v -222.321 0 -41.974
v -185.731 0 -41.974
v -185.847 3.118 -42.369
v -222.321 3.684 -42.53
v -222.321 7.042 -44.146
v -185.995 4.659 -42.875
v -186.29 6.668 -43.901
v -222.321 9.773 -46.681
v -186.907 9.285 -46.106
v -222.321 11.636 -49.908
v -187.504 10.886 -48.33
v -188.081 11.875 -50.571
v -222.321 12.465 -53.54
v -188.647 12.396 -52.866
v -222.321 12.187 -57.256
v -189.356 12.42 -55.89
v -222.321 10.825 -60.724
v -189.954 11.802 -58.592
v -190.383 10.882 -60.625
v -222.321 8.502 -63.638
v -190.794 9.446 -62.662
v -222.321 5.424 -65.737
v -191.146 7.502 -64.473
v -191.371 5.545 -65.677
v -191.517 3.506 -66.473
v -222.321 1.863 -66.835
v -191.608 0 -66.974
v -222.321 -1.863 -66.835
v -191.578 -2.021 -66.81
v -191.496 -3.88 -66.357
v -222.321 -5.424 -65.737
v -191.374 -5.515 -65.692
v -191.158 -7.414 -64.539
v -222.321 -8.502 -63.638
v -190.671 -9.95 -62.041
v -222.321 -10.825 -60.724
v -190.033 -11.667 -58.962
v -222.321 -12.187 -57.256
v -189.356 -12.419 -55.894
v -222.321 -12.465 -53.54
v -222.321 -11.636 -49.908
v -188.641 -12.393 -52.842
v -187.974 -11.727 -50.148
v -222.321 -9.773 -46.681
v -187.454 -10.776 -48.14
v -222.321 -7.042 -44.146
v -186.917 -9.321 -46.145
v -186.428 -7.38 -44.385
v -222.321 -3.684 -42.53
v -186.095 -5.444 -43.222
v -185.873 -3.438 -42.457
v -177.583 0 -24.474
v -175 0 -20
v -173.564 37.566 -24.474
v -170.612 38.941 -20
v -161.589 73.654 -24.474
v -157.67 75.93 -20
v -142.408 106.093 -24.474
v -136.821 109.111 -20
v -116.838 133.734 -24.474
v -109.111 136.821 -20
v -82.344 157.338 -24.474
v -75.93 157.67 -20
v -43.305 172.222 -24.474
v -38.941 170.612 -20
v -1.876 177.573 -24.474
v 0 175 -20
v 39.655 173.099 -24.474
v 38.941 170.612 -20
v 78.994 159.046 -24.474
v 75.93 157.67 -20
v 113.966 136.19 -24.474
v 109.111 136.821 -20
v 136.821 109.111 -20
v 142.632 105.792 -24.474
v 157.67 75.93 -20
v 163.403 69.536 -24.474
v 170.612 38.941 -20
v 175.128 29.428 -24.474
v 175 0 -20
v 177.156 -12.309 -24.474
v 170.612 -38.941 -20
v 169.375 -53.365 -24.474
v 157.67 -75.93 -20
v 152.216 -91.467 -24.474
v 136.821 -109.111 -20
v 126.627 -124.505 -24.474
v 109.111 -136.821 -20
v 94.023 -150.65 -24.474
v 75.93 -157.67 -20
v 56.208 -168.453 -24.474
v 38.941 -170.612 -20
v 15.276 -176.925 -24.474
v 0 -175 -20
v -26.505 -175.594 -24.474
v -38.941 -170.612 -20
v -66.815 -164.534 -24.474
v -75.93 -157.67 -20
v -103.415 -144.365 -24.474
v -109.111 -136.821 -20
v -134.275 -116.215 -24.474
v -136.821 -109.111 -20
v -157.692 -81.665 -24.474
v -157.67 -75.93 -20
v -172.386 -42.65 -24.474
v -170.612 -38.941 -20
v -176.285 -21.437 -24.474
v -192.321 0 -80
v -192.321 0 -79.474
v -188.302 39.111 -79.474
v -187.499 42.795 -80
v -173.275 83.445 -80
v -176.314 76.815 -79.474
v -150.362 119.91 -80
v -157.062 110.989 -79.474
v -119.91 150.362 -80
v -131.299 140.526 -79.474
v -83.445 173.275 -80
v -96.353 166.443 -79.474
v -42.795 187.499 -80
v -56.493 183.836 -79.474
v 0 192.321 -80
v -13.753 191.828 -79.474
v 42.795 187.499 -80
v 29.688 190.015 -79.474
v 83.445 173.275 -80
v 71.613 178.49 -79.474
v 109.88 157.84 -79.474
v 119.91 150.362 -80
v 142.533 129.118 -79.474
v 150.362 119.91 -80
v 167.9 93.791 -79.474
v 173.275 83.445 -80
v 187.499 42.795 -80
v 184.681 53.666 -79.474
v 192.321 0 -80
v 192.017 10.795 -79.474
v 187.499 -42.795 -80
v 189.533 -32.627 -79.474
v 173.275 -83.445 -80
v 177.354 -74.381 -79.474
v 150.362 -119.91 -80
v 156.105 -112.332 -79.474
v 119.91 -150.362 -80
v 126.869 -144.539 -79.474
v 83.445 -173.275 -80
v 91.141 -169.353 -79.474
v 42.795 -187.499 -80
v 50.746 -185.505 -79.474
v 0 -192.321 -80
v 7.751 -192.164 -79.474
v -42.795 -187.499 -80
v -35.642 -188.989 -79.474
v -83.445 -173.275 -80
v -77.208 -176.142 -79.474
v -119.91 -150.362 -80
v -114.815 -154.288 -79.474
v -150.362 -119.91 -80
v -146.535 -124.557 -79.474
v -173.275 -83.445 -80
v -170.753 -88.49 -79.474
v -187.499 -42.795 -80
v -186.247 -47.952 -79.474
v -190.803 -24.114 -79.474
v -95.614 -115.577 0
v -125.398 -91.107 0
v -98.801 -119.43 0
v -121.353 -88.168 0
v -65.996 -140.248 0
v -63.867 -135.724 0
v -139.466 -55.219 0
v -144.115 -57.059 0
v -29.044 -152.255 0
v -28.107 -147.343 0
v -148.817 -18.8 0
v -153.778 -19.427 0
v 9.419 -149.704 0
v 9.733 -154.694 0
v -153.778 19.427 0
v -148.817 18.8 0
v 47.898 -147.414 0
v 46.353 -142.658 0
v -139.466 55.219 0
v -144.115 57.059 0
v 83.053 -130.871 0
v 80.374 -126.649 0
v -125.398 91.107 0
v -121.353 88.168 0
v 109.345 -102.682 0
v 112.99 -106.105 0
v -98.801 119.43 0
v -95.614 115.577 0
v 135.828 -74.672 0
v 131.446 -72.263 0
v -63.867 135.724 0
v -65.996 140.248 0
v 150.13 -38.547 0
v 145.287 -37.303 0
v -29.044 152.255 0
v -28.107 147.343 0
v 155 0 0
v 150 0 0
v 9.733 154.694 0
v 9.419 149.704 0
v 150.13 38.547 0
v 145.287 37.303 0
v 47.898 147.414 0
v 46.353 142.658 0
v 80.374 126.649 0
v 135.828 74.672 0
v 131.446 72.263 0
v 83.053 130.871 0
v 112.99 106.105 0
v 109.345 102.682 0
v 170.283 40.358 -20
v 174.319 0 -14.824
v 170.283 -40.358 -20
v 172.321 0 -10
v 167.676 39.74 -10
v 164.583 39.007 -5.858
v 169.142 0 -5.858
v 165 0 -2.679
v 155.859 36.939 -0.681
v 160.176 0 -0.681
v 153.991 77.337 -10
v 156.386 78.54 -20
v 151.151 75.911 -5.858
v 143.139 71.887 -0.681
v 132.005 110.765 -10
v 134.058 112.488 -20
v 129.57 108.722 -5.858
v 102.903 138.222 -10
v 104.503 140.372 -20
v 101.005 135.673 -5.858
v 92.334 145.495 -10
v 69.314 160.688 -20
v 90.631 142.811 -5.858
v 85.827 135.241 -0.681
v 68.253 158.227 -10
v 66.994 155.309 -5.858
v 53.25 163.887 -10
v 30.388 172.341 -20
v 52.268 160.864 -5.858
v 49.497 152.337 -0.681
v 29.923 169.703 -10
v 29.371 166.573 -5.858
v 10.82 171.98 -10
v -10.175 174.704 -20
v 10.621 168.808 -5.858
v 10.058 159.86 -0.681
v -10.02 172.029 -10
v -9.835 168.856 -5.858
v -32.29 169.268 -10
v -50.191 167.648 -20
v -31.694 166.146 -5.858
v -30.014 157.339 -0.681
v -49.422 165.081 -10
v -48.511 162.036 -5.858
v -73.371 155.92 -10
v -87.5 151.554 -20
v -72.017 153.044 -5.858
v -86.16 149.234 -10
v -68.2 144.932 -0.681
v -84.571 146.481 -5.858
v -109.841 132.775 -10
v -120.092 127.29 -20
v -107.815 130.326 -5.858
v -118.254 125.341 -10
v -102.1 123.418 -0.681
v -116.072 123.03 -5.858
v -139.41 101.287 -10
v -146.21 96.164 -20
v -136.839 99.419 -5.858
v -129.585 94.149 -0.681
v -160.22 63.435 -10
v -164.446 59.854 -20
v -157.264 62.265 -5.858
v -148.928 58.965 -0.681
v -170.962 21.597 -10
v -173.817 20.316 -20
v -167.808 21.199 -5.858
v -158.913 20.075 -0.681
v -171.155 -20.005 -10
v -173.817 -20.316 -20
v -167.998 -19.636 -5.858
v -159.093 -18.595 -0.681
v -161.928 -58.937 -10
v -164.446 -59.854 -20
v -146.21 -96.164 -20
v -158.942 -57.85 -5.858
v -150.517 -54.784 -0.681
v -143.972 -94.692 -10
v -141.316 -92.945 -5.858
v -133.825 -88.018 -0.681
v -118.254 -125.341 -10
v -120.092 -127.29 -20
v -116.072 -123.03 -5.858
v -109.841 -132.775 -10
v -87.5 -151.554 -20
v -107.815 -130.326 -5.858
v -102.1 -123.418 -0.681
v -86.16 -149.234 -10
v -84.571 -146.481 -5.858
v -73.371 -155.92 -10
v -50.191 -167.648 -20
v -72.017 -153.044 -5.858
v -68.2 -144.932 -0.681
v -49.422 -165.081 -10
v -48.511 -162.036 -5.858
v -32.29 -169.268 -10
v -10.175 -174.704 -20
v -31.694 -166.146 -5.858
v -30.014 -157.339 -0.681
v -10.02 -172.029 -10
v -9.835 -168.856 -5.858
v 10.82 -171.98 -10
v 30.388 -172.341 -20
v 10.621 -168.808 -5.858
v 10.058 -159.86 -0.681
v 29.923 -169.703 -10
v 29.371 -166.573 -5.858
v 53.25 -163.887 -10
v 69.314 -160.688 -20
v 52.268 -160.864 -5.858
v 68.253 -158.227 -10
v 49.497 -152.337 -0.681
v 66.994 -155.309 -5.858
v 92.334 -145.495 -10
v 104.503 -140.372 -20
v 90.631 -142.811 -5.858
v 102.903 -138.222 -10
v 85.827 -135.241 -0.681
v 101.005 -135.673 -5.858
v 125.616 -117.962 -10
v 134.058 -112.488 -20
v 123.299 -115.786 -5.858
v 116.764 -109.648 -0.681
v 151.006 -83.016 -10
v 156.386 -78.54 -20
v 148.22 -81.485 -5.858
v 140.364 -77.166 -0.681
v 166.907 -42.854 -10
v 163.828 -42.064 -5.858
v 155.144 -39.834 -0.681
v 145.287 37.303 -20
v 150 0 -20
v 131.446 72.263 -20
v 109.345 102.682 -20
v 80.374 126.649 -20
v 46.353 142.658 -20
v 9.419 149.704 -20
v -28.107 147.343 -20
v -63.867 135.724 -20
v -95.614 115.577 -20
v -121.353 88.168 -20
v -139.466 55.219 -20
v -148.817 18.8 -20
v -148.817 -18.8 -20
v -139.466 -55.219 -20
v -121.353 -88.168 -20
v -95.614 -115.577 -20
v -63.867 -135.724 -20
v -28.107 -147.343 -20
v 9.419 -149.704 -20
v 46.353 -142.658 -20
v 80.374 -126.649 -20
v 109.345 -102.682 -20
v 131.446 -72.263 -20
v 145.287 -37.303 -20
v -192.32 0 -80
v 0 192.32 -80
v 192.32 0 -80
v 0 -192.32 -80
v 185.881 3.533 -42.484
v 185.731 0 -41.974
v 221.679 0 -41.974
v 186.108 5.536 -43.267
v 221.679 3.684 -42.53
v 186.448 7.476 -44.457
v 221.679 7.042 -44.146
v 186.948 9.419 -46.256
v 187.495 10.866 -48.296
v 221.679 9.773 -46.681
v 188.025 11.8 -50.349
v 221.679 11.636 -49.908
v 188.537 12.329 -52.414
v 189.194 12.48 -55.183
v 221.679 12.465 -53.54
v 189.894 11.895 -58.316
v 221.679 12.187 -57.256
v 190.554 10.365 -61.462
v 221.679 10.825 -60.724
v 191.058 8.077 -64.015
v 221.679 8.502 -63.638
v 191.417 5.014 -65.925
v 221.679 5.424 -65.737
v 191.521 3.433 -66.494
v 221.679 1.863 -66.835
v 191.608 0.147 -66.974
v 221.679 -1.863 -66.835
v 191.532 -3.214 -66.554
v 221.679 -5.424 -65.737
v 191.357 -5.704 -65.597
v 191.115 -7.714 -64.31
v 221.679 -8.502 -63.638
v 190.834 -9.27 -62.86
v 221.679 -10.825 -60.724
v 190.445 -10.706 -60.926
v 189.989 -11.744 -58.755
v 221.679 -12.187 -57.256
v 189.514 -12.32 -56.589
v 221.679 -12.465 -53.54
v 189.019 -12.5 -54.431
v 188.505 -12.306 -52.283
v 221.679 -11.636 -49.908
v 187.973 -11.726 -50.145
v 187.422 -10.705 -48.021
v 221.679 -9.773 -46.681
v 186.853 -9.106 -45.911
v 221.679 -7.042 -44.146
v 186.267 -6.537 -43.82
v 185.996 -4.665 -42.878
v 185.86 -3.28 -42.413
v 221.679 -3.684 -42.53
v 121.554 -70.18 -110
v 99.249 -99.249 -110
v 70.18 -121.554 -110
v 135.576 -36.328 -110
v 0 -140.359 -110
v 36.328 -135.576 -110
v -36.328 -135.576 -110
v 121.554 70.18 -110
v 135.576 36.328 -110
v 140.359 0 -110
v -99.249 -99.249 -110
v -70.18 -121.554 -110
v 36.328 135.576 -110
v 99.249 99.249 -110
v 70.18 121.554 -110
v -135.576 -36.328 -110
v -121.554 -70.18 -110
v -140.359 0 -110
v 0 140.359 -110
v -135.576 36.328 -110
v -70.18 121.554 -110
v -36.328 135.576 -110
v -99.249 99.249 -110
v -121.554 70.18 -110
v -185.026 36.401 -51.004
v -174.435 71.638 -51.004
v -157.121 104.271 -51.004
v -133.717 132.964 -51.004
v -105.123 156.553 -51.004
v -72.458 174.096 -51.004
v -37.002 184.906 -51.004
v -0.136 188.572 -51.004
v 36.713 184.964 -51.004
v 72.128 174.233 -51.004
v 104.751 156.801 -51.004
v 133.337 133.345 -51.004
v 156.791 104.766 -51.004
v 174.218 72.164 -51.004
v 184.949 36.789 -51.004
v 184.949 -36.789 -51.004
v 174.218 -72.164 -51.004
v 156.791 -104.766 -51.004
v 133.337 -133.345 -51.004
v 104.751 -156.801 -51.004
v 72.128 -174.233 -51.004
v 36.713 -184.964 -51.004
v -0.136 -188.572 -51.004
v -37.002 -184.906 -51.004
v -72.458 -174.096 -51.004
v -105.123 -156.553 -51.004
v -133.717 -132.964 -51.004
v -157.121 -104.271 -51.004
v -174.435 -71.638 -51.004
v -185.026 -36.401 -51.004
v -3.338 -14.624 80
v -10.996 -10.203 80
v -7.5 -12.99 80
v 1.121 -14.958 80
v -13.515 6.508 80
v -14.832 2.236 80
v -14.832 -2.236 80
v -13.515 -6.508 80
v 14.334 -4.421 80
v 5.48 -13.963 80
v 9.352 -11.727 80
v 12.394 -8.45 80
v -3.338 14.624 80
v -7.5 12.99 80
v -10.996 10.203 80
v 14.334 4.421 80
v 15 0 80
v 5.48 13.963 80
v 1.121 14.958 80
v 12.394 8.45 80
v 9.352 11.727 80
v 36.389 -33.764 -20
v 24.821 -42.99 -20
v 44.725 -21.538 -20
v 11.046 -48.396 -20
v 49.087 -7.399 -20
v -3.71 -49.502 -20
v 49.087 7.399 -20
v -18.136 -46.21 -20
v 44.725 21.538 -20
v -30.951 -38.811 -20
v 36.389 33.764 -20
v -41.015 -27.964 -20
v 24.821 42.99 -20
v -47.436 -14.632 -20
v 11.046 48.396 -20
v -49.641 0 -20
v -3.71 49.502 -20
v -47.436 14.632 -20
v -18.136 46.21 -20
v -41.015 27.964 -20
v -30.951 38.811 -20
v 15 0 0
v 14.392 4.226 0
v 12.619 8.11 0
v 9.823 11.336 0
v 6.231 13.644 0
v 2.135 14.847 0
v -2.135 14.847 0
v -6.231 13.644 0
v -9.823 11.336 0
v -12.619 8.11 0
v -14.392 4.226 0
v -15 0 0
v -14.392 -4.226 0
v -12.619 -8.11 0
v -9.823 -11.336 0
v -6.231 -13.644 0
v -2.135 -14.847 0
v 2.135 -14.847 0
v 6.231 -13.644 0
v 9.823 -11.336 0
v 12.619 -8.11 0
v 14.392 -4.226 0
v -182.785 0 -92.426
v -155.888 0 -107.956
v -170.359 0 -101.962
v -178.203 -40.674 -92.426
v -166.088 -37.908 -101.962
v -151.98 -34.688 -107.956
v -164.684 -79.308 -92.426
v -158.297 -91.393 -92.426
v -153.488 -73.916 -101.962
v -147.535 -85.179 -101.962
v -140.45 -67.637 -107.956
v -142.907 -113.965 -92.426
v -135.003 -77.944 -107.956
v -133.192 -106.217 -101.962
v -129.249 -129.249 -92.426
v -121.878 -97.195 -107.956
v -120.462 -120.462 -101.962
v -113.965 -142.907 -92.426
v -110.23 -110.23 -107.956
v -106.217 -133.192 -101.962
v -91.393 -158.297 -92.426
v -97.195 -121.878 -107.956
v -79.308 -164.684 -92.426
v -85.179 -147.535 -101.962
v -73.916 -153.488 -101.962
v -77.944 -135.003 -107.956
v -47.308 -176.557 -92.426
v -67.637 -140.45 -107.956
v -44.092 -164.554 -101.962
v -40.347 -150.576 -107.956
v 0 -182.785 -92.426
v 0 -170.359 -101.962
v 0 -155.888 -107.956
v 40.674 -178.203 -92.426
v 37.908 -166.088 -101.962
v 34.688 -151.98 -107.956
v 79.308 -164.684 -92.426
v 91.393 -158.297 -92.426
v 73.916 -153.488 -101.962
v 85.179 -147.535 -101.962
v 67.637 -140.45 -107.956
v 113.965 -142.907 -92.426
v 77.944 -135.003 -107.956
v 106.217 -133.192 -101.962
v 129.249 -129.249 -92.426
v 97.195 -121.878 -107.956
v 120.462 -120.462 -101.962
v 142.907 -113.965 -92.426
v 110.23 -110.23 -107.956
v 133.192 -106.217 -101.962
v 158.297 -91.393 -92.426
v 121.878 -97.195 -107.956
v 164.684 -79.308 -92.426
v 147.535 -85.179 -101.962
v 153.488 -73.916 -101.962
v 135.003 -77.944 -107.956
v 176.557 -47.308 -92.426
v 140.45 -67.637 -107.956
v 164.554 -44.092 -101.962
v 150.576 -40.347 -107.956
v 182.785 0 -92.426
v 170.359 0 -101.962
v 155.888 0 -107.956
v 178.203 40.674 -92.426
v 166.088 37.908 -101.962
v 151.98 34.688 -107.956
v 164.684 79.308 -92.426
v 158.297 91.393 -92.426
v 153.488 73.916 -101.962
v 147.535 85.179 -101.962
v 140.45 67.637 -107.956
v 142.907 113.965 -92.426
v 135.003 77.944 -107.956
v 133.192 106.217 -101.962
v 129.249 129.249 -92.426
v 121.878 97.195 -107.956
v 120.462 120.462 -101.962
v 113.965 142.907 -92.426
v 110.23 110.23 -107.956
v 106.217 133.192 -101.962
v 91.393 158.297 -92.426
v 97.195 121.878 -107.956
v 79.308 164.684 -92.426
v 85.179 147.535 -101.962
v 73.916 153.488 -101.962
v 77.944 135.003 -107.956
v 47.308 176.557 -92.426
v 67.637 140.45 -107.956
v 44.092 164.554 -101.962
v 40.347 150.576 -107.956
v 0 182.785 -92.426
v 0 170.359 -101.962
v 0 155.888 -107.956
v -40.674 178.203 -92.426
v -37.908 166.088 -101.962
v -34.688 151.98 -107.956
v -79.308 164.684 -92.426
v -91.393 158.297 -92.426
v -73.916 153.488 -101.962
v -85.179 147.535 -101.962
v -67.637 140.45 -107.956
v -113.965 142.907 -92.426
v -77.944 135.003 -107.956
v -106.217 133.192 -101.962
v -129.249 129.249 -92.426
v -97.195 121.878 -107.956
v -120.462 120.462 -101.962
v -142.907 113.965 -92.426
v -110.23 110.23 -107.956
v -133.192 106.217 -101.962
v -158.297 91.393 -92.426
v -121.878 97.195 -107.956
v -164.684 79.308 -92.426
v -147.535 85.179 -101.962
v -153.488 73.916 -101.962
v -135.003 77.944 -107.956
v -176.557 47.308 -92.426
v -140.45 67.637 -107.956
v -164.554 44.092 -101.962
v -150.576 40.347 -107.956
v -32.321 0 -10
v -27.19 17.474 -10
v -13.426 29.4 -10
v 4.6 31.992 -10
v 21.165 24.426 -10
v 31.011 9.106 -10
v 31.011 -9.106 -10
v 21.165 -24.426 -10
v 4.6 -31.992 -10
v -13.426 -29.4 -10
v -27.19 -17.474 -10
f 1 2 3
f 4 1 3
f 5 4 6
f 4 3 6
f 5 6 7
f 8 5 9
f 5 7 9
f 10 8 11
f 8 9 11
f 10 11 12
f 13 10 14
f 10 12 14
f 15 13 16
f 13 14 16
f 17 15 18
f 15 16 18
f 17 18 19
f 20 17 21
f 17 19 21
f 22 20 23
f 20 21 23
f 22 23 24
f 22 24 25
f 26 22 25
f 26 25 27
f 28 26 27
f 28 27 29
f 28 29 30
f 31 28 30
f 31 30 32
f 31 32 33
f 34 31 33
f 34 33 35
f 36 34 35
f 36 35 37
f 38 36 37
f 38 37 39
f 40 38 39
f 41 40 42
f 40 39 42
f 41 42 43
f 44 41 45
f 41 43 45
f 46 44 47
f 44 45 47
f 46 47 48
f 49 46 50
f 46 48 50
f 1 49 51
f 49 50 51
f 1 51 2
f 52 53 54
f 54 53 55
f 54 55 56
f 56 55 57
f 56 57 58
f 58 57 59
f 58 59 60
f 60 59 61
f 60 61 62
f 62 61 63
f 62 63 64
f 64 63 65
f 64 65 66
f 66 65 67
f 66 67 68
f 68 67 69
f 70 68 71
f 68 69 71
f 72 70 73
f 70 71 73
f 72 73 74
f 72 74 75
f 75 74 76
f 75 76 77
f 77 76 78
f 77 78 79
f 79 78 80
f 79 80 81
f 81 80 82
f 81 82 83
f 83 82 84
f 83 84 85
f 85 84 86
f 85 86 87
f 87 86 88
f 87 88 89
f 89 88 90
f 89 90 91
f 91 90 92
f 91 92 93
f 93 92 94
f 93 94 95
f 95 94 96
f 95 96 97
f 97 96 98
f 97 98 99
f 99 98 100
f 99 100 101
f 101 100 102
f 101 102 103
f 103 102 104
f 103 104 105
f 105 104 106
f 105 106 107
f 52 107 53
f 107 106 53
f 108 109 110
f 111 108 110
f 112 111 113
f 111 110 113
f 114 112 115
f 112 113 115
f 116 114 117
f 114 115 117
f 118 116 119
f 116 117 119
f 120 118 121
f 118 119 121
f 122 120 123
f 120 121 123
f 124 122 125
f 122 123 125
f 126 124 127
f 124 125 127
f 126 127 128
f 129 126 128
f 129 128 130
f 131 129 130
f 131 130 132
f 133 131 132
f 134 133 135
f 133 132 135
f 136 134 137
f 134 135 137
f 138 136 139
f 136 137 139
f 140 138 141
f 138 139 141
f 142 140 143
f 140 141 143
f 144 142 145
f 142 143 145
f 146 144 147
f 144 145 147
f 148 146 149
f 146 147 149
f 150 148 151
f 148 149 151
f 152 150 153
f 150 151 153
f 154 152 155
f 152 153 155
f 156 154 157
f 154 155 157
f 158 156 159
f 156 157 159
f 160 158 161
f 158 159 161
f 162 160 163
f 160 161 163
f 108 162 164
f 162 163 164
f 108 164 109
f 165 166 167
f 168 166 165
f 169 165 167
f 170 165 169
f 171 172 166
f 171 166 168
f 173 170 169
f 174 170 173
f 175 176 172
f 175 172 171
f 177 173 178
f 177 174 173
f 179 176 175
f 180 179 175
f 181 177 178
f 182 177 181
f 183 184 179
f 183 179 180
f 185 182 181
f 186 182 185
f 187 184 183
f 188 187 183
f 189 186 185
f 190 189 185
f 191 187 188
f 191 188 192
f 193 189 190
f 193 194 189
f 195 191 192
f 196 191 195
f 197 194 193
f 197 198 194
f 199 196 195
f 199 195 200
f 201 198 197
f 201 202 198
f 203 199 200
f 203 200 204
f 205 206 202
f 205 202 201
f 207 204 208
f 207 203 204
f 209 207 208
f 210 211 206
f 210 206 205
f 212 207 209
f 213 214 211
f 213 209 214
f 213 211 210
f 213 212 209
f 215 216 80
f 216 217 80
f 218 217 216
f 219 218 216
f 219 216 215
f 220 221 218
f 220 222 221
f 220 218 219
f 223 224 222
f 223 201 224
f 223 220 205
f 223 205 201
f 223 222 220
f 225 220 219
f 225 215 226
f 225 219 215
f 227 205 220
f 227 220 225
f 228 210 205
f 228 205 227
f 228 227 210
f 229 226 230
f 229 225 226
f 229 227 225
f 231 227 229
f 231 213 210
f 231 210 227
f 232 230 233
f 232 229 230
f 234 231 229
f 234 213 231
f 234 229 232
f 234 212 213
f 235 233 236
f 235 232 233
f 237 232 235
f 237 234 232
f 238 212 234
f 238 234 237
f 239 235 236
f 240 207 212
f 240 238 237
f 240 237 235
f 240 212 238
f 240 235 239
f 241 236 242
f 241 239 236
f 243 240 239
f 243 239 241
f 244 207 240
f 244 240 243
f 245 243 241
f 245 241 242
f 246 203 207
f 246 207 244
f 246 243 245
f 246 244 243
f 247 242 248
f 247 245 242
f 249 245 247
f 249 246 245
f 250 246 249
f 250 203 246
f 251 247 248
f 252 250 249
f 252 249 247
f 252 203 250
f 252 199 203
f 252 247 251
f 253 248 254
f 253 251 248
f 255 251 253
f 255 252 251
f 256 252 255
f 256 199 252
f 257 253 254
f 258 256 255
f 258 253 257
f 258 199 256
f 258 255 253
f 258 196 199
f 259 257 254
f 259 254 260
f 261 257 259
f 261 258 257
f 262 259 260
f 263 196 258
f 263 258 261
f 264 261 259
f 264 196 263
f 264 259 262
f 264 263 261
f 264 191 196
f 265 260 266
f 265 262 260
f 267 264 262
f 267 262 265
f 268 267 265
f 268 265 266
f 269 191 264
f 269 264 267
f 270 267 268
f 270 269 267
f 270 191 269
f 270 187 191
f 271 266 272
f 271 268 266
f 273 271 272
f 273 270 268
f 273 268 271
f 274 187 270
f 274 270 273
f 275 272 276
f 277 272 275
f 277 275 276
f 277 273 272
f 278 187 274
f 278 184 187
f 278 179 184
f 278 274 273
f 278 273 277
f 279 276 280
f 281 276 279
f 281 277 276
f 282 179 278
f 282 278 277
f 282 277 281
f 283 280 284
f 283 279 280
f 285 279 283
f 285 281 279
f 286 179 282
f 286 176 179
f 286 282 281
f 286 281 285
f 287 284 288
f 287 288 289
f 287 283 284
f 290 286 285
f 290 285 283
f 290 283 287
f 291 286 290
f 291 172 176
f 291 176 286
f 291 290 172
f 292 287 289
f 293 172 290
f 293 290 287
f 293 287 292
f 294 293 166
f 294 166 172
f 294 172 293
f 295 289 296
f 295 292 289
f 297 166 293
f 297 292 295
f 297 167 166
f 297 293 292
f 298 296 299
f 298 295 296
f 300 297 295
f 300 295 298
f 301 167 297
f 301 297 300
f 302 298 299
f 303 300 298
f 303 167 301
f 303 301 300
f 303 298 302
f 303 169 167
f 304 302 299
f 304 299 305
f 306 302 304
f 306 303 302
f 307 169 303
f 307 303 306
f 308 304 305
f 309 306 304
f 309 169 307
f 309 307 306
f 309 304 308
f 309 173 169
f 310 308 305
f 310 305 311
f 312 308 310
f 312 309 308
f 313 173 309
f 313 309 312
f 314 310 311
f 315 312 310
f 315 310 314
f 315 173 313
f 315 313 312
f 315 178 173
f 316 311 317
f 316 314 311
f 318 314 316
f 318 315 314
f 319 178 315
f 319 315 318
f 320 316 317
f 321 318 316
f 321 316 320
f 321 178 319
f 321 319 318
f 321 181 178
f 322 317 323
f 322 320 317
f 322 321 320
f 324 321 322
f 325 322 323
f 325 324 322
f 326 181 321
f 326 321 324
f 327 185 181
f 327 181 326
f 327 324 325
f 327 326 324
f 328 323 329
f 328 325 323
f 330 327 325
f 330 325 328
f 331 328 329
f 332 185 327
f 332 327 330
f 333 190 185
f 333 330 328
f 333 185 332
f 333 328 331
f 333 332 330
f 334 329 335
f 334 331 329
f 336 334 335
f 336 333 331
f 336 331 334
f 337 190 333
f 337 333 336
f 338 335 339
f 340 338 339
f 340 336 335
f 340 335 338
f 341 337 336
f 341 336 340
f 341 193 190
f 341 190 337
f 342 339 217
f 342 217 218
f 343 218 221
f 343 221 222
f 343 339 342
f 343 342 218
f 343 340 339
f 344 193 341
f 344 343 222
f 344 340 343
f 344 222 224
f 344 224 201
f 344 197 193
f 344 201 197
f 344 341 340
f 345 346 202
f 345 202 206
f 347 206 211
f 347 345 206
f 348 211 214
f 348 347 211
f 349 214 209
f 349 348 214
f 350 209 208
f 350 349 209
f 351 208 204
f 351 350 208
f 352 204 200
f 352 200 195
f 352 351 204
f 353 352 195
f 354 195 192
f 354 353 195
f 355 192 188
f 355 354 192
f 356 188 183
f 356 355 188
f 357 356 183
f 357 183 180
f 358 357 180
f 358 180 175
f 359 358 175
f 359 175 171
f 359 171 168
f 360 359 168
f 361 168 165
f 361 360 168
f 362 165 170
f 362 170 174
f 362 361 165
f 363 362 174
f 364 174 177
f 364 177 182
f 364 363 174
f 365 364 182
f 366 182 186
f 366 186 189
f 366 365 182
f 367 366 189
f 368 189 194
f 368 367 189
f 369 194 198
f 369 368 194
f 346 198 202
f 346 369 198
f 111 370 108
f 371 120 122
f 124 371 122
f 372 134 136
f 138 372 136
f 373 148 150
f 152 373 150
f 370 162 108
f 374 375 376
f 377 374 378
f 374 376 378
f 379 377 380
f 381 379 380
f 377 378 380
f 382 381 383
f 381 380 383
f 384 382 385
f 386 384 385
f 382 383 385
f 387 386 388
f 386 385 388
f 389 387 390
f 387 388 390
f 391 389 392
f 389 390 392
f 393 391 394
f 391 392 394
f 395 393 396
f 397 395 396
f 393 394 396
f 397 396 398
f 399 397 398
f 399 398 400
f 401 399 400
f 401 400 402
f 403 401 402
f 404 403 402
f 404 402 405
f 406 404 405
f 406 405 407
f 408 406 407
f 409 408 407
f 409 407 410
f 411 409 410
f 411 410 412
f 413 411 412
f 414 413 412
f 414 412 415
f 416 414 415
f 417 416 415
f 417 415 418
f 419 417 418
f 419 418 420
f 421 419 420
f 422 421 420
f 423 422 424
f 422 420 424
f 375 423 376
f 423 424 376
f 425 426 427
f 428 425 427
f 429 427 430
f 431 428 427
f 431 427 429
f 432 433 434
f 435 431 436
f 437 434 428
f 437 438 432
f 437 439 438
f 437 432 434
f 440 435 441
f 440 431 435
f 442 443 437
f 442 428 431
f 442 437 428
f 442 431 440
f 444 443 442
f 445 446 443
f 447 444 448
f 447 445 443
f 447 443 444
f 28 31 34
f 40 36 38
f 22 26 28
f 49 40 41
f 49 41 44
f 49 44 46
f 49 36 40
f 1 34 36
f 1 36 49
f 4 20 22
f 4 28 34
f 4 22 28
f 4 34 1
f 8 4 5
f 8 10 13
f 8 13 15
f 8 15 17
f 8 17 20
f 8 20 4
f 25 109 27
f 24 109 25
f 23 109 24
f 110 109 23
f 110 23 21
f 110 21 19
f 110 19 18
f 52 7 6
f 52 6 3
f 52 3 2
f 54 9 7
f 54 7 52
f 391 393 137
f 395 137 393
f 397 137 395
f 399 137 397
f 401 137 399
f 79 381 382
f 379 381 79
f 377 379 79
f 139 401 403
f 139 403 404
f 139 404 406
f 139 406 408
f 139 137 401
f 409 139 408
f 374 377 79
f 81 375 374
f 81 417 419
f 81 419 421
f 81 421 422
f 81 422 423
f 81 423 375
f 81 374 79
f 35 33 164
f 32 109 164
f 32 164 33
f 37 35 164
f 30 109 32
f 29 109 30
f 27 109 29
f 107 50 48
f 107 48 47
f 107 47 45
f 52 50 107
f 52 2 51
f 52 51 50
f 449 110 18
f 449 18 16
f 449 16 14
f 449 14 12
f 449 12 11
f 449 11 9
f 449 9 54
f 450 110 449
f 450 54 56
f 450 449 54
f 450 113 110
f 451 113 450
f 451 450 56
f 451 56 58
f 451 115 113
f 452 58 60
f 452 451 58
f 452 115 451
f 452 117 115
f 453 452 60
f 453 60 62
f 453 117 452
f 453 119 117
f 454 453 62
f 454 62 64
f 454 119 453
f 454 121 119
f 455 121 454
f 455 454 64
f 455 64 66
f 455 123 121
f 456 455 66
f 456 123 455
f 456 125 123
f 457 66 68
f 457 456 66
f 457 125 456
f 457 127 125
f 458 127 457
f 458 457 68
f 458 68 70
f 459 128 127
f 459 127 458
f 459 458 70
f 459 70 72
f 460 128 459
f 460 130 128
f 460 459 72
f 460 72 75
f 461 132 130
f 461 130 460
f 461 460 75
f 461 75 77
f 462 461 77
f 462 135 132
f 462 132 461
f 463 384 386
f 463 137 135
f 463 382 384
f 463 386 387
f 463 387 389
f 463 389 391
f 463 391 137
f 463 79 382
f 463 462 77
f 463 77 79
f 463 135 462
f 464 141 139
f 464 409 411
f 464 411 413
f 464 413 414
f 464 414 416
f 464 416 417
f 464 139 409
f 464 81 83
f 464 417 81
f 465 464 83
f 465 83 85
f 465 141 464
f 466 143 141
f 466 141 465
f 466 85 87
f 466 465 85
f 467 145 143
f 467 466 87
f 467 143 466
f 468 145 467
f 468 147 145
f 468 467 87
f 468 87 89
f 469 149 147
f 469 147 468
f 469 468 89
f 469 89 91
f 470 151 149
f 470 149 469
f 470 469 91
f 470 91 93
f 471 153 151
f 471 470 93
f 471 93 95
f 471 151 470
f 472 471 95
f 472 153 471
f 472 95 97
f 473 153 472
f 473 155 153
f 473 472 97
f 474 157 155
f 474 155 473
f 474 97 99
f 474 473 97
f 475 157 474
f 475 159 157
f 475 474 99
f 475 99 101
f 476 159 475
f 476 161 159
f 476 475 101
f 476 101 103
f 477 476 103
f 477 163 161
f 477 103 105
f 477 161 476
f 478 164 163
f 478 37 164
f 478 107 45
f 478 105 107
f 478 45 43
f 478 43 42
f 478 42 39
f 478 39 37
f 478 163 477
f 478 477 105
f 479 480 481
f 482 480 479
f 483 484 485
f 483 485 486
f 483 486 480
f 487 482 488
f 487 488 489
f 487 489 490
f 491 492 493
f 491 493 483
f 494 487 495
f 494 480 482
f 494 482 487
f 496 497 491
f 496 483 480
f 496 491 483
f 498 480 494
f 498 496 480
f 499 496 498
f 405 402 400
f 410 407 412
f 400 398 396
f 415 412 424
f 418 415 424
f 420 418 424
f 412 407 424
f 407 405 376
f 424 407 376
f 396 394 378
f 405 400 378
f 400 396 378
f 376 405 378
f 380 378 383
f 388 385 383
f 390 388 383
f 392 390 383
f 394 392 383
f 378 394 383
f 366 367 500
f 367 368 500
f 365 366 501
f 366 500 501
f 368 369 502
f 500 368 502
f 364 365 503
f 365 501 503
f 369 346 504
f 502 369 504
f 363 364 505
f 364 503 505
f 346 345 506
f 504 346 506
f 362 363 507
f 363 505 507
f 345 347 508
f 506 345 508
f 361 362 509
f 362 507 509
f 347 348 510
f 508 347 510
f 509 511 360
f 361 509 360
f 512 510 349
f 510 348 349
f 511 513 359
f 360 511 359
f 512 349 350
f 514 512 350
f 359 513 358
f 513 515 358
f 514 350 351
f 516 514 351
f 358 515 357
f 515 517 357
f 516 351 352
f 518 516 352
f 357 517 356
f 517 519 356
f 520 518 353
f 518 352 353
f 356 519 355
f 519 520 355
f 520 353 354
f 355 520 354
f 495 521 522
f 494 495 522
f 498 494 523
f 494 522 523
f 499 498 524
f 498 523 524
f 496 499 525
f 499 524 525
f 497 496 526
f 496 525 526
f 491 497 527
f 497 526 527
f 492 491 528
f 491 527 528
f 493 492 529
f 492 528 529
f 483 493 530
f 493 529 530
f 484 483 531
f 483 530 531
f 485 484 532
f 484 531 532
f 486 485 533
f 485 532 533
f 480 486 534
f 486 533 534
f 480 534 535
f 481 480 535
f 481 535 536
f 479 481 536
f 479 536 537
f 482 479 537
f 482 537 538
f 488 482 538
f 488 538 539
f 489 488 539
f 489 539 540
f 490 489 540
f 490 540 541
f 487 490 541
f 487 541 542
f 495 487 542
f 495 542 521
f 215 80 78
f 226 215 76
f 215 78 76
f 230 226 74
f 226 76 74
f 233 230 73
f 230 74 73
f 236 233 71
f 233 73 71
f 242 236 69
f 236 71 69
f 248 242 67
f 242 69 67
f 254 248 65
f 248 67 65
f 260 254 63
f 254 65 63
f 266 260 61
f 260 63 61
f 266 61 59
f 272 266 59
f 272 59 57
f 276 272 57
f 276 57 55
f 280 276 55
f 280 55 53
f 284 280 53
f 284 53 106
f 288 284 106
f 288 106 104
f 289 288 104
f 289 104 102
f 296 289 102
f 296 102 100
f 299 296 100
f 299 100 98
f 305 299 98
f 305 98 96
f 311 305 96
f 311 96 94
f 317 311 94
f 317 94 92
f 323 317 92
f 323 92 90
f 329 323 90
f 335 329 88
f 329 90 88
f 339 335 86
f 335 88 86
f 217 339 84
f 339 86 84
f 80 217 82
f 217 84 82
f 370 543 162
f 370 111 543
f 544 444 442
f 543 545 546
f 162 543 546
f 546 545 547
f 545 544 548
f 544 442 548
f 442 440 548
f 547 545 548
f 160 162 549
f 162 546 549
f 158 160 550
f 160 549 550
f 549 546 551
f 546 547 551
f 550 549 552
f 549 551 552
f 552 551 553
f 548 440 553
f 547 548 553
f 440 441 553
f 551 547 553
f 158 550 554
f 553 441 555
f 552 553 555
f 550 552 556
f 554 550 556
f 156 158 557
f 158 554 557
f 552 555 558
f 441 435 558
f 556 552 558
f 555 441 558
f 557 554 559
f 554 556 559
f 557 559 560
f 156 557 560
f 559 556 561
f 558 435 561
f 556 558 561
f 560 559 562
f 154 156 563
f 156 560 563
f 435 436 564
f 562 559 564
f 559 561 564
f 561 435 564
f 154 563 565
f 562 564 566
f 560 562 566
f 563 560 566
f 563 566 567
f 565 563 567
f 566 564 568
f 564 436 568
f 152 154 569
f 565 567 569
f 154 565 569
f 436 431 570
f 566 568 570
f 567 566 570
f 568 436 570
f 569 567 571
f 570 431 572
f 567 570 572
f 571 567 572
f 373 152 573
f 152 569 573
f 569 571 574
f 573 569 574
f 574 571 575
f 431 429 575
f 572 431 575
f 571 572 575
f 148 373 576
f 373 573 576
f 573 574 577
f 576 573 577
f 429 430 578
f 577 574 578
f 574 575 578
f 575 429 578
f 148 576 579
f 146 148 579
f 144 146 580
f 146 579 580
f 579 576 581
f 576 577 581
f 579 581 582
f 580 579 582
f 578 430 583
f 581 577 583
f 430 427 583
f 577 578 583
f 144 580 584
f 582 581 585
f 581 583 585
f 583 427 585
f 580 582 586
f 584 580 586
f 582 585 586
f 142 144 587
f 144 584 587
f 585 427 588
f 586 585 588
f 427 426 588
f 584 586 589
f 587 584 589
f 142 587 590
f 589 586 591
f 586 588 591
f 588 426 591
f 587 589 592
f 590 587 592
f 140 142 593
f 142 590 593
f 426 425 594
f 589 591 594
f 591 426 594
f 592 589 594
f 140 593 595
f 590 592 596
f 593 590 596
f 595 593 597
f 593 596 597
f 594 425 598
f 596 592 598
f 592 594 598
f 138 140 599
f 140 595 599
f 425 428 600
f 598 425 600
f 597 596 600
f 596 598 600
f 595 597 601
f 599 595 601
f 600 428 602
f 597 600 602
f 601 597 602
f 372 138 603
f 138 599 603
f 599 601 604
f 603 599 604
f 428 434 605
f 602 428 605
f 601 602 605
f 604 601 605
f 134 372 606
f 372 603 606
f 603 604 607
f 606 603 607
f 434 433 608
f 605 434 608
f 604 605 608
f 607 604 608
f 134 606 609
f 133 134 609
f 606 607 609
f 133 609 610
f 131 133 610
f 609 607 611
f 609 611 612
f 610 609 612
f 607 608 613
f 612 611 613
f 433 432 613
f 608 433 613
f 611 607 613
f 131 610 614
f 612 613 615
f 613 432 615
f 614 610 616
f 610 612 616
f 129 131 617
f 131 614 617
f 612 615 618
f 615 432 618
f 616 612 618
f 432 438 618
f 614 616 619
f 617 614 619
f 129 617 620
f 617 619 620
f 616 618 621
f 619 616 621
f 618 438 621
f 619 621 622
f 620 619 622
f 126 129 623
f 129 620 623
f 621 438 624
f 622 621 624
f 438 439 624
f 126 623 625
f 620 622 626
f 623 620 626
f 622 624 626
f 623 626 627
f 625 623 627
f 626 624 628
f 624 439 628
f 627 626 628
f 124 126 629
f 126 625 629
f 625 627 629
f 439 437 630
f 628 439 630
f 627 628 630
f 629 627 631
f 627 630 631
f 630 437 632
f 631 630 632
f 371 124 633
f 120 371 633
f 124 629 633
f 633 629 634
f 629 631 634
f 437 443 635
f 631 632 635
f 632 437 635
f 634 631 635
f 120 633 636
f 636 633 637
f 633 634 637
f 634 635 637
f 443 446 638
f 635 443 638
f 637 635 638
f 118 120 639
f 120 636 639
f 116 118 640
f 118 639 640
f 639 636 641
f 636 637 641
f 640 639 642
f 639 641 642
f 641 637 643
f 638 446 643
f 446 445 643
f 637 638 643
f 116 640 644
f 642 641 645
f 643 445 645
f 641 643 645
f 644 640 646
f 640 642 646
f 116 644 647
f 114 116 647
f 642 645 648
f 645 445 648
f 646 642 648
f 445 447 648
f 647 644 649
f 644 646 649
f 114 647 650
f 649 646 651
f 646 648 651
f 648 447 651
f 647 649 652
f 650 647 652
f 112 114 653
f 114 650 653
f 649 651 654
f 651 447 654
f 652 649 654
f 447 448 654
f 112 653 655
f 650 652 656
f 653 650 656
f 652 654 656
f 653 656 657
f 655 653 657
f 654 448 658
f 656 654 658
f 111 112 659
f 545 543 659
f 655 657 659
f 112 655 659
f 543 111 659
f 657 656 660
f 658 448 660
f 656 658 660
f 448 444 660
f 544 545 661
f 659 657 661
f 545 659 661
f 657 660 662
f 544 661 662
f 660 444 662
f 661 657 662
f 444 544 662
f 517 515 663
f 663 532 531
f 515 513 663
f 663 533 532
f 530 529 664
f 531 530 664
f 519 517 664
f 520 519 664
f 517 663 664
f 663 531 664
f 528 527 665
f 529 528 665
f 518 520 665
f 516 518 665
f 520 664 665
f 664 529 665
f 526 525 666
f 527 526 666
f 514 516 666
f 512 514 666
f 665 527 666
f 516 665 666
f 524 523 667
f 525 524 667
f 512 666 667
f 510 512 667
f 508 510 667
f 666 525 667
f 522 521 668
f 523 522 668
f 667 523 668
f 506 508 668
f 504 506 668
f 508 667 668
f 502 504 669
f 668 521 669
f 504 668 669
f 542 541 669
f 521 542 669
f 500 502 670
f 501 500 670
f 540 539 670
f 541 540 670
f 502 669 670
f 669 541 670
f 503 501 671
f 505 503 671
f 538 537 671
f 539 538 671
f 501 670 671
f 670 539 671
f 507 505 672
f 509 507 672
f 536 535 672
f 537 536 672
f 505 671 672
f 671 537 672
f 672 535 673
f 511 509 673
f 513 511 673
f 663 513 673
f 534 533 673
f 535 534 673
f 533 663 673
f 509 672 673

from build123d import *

# Parameters (mm, degrees)
SKETCH1_R                = 15
BOSS_EXTRUDE1_DEPTH      = 80
SKETCH2_R                = 15
BOSS_EXTRUDE2_DEPTH      = 20
BOSS_EXTRUDE2_DRAFT      = -60
SKETCH3_R                = 175
BOSS_EXTRUDE5_DEPTH      = 30
BOSS_EXTRUDE5_DRAFT      = -30
SKETCH6_R                = 175
SKETCH6_R_2              = 150
BOSS_EXTRUDE6_DEPTH      = 20
SKETCH7_R                = 192.320508076
BOSS_EXTRUDE7_DEPTH      = 30
SKETCH9_R                = 192.320508076
BOSS_EXTRUDE8_DEPTH      = 30
BOSS_EXTRUDE8_TAPER      = 30
FILLET2_R                = 60
FILLET3_R                = 110
FILLET4_R                = 20
BOSS_EXTRUDE9_DEPTH      = 30
BOSS_EXTRUDE9_DEPTH_BACK = 414
SKETCH10_R               = 12.5


with BuildPart() as part:
    # Sketch1 → Boss-Extrude1 (new body)
    with BuildSketch(Plane.XY):
        Circle(SKETCH1_R)
    extrude(amount=BOSS_EXTRUDE1_DEPTH)


with BuildPart() as boss_extrude2_tool:
    # Sketch2 → Boss-Extrude2 (with draft: the straight prism first)
    with BuildSketch(Plane(origin=(0, 0, 0), x_dir=(-1, 0, 0), z_dir=(0, 0, -1))):
        Circle(SKETCH2_R)
    extrude(amount=BOSS_EXTRUDE2_DEPTH)
    # Boss-Extrude2: the draft: its side faces are tilted about the plane it starts from
    boss_extrude2_sides = [boss_extrude2_tool.faces().sort_by_distance(p)[0] for p in [
        (15, 0, -10),
    ]]
    draft(boss_extrude2_sides, Plane(origin=(0, 0, 0), x_dir=(-1, 0, 0), z_dir=(0, 0, -1)), BOSS_EXTRUDE2_DRAFT)


with BuildPart() as part_1:
    add(part.part)

    # Boss-Extrude2: add boss_extrude2_tool
    add(boss_extrude2_tool.part)


with BuildPart() as boss_extrude5_tool:
    # Sketch3 → Boss-Extrude5 (with draft: the straight prism first)
    with BuildSketch(Plane(origin=(0, 0, -20), x_dir=(-1, 0, 0), z_dir=(0, 0, -1))):
        Circle(SKETCH3_R)
    extrude(amount=BOSS_EXTRUDE5_DEPTH)
    # Boss-Extrude5: the draft: its side faces are tilted about the plane it starts from
    boss_extrude5_sides = [boss_extrude5_tool.faces().sort_by_distance(p)[0] for p in [
        (175, 0, -35),
    ]]
    draft(boss_extrude5_sides, Plane(origin=(0, 0, -20), x_dir=(-1, 0, 0), z_dir=(0, 0, -1)), BOSS_EXTRUDE5_DRAFT)


with BuildPart() as part_2:
    add(part_1.part)

    # Boss-Extrude5: add boss_extrude5_tool
    add(boss_extrude5_tool.part)

    # Sketch6 → Boss-Extrude6 (add)
    with BuildSketch(Plane.XY.offset(-20)):
        Circle(SKETCH6_R)
        Circle(SKETCH6_R_2, mode=Mode.SUBTRACT)
    extrude(amount=BOSS_EXTRUDE6_DEPTH)

    # Sketch7 → Boss-Extrude7 (add)
    with BuildSketch(Plane(origin=(0, 0, -50), x_dir=(-1, 0, 0), z_dir=(0, 0, -1))):
        Circle(SKETCH7_R)
    extrude(amount=BOSS_EXTRUDE7_DEPTH)

    # Sketch9 → Boss-Extrude8 (add)
    with BuildSketch(Plane(origin=(0, 0, -80), x_dir=(-1, 0, 0), z_dir=(0, 0, -1))):
        Circle(SKETCH9_R)
    extrude(amount=BOSS_EXTRUDE8_DEPTH, taper=BOSS_EXTRUDE8_TAPER)

    # Fillet2
    fillet2_edges = [part_2.edges().sort_by_distance(p)[0] for p in [
        (175, 0, -110),
    ]]
    fillet(fillet2_edges, radius=FILLET2_R - 0.0001)  # a hair under: the kernel refuses the full size

    # Fillet3
    fillet3_edges = [part_2.edges().sort_by_distance(p)[0] for p in [
        (192.320508076, 0, -50),
    ]]
    fillet(fillet3_edges, radius=FILLET3_R)

    # Fillet4
    fillet4_edges = [part_2.edges().sort_by_distance(p)[0] for p in [
        (-175, 0, 0),
    ]]
    fillet(fillet4_edges, radius=FILLET4_R - 0.0001)  # a hair under: the kernel refuses the full size

    # Sketch10 → Boss-Extrude9 (add, two sides: drawn at the far end of the back side and taken through both)
    with BuildSketch(Plane.ZY.offset(192.320508076).offset(-BOSS_EXTRUDE9_DEPTH_BACK)):
        with Locations((-54.474411167, 0)):
            Circle(SKETCH10_R)
    extrude(amount=BOSS_EXTRUDE9_DEPTH + BOSS_EXTRUDE9_DEPTH_BACK)


solid = part_2.part
